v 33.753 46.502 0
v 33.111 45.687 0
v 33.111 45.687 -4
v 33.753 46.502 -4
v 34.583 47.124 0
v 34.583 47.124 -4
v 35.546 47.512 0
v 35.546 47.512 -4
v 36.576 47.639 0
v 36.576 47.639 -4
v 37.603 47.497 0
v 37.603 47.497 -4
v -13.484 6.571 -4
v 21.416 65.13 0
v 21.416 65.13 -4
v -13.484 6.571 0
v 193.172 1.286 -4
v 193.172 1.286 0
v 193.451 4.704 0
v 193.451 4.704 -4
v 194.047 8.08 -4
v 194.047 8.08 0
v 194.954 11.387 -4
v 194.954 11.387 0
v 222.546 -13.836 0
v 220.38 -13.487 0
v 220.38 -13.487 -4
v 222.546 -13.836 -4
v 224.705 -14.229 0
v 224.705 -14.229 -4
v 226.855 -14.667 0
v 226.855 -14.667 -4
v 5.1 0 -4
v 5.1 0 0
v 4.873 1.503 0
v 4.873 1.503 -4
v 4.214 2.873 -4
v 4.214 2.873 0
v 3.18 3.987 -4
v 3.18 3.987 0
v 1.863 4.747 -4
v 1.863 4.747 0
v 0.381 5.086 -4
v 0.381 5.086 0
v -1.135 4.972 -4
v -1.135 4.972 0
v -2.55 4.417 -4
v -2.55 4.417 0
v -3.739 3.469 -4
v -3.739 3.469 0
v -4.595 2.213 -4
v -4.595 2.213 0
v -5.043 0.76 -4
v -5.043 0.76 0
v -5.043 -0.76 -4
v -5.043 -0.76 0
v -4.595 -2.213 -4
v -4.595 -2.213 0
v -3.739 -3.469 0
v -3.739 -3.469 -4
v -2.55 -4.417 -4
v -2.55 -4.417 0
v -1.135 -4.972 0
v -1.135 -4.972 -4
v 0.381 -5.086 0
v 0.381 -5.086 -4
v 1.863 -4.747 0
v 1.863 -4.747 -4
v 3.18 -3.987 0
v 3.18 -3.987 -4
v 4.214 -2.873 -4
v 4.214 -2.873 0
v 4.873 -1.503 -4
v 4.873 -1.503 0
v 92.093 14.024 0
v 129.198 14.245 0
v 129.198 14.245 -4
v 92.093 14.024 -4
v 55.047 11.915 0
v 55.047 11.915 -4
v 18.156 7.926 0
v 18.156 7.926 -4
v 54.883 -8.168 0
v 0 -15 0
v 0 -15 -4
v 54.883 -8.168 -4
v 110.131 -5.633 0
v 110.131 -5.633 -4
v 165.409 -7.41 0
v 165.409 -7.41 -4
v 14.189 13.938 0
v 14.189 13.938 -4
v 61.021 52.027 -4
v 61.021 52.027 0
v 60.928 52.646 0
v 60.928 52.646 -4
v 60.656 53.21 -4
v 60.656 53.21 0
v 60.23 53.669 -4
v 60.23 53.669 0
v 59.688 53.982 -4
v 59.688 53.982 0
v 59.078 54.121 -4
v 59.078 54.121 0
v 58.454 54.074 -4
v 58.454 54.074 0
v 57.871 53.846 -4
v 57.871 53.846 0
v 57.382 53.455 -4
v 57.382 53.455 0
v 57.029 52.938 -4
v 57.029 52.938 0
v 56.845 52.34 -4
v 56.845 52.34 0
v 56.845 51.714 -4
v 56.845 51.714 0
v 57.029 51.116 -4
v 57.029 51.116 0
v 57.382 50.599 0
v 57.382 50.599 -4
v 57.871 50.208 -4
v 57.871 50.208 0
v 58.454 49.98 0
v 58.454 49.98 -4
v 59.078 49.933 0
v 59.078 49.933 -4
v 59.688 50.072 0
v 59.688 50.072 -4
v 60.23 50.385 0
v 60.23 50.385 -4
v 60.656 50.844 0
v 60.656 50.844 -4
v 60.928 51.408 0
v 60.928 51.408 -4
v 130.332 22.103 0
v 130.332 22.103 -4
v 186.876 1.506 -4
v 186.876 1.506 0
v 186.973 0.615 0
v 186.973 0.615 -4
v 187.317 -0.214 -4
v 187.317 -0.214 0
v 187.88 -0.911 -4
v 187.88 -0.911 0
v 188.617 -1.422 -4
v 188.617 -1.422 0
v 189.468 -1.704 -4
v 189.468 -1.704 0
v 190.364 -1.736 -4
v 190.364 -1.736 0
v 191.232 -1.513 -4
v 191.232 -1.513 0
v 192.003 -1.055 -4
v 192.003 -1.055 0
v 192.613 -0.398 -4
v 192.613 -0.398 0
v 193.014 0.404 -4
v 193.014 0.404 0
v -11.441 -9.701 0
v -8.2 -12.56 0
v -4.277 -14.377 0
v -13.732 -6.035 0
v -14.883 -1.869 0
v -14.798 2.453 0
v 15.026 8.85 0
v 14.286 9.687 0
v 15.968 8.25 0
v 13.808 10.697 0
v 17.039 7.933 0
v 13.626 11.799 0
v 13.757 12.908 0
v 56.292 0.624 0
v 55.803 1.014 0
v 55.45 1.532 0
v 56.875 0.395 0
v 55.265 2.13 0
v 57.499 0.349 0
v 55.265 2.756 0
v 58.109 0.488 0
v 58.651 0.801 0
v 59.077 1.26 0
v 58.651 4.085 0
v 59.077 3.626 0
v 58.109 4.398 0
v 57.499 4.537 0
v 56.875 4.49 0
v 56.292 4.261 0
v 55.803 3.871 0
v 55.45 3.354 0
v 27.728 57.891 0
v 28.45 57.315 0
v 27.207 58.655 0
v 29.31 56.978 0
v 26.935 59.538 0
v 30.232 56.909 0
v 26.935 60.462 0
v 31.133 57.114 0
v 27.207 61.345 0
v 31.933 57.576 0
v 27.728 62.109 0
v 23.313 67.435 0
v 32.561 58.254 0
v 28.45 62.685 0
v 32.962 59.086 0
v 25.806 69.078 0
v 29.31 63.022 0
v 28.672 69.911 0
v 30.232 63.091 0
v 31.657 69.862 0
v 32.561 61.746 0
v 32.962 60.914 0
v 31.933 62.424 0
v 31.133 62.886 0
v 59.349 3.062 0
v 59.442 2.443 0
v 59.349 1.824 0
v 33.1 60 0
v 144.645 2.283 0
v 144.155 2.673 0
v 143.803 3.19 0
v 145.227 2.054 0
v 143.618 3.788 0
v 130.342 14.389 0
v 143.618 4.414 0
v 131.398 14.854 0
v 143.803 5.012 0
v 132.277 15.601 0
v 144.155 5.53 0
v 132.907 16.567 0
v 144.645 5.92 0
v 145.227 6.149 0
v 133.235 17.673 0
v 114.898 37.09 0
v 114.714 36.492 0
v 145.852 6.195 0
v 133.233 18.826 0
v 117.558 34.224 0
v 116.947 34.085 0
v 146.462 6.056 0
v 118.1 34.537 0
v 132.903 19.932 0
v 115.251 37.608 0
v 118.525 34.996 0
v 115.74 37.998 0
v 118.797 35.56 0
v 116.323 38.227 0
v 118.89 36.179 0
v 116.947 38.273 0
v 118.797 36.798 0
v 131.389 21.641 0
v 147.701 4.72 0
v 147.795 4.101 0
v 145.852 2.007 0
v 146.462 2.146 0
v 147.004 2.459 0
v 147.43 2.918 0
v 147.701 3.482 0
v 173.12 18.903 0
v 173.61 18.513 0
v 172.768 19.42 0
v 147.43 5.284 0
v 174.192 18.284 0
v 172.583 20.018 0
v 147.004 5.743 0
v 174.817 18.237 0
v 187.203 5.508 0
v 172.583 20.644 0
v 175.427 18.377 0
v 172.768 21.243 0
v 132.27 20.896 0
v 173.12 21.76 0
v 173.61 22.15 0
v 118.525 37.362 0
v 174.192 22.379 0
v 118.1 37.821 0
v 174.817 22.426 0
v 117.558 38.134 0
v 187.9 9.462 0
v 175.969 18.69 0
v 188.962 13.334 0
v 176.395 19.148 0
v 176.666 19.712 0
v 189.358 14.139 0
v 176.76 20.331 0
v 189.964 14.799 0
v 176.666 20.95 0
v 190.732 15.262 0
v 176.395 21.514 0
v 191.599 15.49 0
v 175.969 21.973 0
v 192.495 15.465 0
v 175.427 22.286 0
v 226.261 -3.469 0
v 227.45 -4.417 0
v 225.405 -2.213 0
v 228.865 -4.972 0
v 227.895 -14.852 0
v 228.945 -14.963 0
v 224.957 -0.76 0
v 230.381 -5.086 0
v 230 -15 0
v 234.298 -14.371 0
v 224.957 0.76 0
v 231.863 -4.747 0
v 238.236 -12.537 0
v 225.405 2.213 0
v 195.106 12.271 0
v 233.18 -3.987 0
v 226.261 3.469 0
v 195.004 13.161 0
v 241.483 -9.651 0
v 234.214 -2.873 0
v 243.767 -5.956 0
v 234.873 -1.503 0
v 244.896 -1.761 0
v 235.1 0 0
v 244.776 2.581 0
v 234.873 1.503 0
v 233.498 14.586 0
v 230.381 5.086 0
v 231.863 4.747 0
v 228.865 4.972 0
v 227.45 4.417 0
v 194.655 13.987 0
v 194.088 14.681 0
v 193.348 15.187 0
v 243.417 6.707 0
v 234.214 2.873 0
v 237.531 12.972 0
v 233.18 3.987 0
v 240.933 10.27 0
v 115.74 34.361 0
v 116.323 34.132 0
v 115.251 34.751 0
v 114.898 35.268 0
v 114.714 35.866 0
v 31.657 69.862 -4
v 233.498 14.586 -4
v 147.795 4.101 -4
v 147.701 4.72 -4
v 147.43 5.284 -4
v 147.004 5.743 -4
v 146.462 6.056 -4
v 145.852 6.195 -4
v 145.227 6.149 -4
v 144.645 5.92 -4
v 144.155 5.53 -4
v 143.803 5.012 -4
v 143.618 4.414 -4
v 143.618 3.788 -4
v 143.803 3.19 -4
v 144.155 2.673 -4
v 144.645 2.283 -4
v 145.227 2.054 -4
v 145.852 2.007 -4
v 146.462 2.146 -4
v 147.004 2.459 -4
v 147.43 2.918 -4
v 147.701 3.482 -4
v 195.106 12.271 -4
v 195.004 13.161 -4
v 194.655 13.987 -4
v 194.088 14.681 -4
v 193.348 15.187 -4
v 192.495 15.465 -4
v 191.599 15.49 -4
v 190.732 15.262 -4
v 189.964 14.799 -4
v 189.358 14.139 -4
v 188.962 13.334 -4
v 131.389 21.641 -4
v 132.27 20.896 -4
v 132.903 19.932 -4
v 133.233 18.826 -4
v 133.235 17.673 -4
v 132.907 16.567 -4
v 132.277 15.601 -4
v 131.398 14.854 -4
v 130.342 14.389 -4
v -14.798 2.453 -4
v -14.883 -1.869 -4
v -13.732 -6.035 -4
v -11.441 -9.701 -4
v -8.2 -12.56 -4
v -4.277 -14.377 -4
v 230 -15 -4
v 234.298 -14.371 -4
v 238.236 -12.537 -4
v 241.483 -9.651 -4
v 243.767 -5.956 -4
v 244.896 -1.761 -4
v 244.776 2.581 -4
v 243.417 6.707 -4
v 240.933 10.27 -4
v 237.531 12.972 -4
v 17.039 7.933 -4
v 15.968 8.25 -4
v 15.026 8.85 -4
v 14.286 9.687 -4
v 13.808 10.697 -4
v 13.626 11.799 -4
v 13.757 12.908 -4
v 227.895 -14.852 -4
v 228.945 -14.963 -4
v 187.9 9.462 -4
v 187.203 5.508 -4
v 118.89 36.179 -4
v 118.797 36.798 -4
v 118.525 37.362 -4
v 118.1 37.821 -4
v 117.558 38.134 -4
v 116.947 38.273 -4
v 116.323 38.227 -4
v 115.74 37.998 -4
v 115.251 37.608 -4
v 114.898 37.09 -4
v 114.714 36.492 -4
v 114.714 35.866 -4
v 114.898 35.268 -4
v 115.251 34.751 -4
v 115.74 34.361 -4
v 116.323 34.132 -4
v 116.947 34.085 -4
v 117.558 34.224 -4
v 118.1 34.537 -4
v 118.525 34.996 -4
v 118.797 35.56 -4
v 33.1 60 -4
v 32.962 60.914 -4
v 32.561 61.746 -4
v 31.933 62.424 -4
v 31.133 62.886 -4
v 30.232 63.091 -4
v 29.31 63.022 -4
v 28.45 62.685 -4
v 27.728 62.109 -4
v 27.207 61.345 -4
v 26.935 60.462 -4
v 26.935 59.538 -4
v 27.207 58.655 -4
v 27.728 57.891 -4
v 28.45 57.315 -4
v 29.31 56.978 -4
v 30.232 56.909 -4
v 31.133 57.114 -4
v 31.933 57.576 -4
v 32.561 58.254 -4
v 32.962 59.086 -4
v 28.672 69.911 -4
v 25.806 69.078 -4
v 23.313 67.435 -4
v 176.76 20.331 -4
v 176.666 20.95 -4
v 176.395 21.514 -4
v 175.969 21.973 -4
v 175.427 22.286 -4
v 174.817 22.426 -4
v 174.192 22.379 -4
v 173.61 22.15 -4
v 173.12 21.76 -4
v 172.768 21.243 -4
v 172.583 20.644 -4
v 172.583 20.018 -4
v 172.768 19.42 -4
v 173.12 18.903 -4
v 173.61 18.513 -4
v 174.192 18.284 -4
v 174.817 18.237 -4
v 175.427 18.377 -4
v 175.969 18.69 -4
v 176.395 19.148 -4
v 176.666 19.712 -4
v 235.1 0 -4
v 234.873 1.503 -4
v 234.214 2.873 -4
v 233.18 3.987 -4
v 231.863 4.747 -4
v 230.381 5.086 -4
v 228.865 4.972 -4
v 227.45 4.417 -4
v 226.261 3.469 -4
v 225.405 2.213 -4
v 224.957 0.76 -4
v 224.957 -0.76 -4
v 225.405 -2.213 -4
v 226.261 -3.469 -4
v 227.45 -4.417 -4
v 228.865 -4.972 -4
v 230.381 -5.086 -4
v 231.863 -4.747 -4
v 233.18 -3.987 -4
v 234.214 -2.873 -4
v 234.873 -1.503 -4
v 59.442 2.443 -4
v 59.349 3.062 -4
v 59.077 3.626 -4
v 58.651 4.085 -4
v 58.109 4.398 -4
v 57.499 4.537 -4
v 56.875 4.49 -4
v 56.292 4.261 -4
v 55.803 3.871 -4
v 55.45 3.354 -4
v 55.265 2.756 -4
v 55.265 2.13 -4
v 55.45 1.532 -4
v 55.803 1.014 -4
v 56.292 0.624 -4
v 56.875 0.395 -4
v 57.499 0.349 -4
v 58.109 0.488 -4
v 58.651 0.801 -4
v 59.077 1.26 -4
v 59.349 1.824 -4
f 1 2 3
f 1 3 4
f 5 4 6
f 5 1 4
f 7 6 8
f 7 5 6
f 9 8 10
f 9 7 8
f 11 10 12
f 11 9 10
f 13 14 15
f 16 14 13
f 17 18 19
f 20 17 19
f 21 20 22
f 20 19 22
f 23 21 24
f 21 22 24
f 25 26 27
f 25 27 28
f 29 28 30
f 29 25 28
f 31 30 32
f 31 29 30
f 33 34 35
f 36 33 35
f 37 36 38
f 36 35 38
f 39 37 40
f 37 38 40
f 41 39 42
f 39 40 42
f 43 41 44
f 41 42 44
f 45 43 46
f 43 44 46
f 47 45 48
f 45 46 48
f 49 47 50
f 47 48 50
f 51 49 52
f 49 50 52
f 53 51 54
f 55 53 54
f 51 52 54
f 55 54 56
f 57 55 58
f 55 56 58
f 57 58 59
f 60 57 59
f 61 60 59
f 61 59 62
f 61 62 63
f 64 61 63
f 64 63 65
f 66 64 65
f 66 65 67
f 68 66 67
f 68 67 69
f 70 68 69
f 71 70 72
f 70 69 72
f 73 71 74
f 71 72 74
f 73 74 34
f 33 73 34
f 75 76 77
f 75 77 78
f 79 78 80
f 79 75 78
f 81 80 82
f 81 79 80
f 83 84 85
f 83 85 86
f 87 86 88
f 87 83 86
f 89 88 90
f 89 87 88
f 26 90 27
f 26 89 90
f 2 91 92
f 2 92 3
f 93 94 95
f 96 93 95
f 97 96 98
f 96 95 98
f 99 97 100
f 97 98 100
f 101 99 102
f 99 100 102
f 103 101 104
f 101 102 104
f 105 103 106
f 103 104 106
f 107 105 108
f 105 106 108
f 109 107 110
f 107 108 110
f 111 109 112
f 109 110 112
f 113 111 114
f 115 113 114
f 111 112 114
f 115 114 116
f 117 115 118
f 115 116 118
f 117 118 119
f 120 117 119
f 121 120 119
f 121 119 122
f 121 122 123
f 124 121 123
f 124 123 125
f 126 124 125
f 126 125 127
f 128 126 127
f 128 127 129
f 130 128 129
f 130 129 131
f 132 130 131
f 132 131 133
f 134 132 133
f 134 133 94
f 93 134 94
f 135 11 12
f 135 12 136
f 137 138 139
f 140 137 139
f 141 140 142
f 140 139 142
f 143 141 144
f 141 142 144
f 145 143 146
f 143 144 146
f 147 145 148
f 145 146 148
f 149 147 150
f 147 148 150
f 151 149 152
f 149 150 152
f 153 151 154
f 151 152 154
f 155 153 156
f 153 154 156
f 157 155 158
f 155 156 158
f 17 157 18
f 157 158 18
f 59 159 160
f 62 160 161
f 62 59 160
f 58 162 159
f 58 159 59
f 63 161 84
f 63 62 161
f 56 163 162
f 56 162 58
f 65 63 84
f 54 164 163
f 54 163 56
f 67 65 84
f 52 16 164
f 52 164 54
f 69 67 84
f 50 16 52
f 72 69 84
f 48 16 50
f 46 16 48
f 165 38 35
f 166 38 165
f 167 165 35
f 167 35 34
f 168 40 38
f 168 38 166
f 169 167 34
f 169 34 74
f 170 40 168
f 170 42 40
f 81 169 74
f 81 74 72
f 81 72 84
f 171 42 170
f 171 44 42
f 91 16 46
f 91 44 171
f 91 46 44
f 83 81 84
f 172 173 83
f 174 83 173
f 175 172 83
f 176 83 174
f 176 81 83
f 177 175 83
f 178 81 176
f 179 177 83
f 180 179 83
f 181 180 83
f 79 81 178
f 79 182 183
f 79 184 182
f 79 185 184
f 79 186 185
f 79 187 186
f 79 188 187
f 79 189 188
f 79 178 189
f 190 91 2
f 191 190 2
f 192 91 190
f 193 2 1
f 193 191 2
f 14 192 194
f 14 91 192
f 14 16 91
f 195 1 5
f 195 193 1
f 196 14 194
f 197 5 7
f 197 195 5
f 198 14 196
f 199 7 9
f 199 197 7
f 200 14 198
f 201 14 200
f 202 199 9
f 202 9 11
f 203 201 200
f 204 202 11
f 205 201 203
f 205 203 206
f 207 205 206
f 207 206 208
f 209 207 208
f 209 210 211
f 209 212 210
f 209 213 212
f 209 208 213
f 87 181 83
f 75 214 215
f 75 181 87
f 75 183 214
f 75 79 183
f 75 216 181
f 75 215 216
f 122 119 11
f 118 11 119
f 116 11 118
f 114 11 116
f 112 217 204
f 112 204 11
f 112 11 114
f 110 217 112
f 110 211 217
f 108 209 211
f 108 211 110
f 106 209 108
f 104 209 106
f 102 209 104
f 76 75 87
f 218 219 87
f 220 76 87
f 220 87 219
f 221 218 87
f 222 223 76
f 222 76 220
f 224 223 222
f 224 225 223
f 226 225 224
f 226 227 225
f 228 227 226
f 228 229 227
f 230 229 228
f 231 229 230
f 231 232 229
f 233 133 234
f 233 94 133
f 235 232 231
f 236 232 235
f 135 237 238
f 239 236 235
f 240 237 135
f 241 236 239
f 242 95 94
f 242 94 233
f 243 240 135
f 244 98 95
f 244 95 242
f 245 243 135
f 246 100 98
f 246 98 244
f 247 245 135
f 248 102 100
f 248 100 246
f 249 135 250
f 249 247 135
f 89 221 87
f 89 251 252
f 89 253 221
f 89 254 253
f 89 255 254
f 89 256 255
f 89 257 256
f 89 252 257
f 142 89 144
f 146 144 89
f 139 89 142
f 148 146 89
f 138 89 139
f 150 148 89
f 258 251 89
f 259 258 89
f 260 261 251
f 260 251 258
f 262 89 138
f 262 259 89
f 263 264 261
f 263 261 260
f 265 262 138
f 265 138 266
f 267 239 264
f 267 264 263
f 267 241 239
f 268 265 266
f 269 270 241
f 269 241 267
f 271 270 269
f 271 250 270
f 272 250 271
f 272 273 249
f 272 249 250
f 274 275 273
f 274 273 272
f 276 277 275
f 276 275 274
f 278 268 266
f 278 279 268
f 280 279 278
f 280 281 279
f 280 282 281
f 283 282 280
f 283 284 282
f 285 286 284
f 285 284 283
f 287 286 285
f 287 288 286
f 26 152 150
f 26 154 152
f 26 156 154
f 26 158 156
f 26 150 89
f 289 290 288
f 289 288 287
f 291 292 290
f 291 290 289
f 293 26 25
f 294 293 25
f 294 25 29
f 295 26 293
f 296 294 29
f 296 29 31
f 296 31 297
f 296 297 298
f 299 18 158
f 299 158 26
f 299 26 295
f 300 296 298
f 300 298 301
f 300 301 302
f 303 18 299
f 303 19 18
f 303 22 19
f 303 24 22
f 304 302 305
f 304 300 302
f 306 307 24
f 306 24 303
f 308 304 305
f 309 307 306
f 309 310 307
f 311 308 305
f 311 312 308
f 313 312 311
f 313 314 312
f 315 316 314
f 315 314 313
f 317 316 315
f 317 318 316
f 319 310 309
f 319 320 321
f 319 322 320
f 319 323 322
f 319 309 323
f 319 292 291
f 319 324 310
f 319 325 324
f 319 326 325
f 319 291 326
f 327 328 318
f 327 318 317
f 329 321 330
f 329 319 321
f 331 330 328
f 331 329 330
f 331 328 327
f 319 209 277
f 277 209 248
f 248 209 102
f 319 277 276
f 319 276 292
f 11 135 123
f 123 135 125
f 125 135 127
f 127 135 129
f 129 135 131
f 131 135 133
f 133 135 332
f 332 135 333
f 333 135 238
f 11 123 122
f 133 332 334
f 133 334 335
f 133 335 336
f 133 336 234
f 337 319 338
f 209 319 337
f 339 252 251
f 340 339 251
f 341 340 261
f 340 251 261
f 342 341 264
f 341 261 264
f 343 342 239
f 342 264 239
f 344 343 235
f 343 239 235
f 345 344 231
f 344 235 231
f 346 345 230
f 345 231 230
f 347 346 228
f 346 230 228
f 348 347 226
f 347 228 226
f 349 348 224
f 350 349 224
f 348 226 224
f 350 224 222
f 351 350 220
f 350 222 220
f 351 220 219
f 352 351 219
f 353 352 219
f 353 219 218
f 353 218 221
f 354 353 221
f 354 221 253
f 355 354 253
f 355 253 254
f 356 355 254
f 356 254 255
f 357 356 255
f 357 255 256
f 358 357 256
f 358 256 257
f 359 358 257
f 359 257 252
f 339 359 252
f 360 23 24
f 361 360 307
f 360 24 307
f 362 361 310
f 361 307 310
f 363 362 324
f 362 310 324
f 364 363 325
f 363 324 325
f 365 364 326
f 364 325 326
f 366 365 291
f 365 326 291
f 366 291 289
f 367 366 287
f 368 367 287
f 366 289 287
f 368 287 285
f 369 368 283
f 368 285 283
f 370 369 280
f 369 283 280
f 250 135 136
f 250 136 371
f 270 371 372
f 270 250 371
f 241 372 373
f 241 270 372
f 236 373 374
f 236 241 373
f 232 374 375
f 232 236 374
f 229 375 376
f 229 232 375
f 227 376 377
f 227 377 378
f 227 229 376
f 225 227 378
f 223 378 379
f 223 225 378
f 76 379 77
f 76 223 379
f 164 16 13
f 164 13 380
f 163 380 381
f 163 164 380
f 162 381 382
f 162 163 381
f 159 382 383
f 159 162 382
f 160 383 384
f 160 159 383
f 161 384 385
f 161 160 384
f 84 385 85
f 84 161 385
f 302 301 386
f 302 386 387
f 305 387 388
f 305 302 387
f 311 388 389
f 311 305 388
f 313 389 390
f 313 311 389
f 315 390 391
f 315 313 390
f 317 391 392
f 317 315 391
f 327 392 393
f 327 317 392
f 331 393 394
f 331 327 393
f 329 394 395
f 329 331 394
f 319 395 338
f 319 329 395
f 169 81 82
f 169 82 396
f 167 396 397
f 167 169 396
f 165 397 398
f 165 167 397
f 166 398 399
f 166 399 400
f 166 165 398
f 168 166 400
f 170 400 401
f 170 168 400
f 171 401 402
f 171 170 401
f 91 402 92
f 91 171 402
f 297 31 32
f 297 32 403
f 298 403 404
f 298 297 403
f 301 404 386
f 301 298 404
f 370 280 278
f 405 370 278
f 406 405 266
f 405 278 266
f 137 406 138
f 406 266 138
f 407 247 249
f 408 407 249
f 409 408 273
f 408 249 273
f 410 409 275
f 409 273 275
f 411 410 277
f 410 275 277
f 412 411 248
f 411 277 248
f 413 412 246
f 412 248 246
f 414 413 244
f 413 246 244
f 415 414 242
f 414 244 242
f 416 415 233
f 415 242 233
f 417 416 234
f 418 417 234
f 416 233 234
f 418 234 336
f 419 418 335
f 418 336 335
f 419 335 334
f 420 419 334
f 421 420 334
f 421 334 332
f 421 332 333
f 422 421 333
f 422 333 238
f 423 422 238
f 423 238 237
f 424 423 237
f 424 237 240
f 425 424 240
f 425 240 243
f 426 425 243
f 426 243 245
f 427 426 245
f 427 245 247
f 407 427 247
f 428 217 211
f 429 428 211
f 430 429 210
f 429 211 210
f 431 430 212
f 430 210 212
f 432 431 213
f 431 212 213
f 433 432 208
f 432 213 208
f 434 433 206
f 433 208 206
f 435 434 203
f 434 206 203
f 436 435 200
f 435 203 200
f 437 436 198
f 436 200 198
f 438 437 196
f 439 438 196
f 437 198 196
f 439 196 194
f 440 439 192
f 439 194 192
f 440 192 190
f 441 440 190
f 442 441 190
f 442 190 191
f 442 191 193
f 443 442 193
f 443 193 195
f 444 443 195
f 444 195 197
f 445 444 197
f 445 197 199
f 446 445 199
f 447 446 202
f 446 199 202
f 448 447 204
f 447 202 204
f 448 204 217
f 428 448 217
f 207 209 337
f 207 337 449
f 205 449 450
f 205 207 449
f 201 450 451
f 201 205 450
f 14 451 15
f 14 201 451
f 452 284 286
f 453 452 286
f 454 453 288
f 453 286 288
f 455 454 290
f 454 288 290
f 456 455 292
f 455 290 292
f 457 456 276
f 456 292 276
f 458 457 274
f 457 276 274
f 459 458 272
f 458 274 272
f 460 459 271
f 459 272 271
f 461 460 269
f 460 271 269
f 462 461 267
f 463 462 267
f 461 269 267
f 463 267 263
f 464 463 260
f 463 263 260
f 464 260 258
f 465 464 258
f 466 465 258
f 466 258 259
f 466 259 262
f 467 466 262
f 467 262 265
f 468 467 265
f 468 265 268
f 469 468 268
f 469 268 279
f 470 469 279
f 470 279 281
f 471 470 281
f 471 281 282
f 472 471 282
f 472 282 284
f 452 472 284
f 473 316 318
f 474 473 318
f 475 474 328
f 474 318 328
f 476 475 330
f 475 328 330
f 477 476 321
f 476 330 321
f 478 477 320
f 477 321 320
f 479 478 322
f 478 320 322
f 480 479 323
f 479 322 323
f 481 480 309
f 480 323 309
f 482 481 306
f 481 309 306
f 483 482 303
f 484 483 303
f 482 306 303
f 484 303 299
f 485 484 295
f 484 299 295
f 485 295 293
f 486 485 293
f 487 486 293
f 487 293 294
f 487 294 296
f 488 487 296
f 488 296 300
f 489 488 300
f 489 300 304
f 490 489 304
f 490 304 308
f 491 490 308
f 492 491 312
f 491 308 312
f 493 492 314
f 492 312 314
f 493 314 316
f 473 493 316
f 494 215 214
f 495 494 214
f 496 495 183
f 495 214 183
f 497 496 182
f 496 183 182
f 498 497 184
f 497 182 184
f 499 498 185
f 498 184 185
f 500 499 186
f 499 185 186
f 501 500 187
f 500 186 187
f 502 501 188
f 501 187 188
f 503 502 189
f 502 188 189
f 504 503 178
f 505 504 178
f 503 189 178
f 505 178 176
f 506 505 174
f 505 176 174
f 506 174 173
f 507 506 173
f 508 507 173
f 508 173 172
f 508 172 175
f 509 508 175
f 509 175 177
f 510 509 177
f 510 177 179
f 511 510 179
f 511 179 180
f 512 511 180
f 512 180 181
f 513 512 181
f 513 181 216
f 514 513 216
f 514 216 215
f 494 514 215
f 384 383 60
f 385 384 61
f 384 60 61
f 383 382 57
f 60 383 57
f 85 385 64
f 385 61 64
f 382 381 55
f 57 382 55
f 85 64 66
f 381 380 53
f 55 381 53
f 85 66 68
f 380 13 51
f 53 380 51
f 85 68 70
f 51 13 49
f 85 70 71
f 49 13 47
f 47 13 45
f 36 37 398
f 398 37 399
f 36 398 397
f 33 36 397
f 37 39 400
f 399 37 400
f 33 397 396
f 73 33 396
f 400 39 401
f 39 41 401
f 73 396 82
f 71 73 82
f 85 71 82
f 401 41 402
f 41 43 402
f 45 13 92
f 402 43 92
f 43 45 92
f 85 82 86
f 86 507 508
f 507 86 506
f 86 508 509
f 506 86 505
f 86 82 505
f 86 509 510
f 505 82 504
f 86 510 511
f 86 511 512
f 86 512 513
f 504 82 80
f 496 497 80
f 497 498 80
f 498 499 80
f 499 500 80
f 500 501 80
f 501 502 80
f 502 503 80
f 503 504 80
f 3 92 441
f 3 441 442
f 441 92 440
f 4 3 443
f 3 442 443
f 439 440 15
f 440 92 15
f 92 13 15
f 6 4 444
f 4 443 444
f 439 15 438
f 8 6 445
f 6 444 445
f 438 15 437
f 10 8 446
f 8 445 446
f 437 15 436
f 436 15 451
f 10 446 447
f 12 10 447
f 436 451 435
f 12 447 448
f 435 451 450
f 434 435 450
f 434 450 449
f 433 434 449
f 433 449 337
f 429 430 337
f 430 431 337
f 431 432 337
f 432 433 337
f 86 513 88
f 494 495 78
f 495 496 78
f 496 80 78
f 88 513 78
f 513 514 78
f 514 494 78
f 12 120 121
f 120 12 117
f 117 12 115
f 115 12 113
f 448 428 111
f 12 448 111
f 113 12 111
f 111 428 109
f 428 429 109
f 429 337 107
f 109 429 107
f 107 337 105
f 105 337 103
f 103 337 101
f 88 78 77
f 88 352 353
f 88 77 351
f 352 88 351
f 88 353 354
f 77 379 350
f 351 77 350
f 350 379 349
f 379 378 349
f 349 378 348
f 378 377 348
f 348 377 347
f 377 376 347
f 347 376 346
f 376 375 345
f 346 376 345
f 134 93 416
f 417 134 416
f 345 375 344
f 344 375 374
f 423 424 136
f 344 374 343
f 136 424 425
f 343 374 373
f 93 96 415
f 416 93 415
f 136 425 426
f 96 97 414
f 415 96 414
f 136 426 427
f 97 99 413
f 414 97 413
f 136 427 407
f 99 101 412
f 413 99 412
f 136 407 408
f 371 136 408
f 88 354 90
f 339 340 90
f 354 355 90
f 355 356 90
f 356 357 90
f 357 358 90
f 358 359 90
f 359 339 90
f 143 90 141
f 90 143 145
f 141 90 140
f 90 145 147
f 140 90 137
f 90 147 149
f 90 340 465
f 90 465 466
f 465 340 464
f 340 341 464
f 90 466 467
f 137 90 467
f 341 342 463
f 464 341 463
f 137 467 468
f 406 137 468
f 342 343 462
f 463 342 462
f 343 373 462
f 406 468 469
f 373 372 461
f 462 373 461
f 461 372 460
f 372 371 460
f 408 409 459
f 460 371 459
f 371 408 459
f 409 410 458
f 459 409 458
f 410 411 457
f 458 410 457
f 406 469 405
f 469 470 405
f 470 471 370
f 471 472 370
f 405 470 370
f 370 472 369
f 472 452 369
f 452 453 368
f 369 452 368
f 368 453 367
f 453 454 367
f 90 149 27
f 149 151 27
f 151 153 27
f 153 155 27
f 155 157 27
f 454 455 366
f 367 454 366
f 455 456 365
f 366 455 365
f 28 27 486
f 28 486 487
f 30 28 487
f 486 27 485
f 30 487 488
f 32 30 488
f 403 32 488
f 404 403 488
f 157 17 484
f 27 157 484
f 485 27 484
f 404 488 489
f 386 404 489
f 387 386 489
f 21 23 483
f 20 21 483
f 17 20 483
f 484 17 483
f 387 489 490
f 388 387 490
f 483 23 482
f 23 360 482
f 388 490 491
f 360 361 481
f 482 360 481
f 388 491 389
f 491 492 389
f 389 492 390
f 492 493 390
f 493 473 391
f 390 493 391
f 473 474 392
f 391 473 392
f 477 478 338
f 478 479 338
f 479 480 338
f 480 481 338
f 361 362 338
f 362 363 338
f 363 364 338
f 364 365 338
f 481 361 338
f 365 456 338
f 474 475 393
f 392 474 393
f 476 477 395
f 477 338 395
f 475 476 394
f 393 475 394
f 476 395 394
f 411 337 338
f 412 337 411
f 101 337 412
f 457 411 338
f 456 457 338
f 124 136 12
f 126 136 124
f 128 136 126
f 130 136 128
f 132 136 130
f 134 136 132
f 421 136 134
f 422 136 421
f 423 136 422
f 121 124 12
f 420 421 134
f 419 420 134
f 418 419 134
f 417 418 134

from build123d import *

# Parameters (mm, degrees)
SKETCH_1_R             = 5.1
SKETCH_1_R_2           = 3.1
SM_BASE_FLANGE_1_DEPTH = 4
SKETCH_29_R            = 2.1
CUT_EXTRUDE_7_DEPTH    = 10
CUT_EXTRUDE_11_DEPTH   = 10


# Sheet-metal steps are written as plain solids
with BuildPart() as part:
    # Sketch 1 → Базовая кромка1 (new body)
    with BuildSketch(Plane.XY):
        with BuildLine():
            Line((21.416256147, 65.130237954), (-13.484101554, 6.571073374))
            ThreePointArc((-13.484101554, 6.571073374), (-12.719396617, -7.950908734), (0, -15))
            ThreePointArc((0, -15), (110.130832642, -5.633175847), (220.379871586, -13.487289734))
            ThreePointArc((220.379871586, -13.487289734), (223.626784147, -14.026708962), (226.855383886, -14.666676157))
            ThreePointArc((226.855383886, -14.666676157), (228.418883679, -14.916436276), (230, -15))
            ThreePointArc((230, -15), (244.896230479, -1.761339697), (233.49830961, 14.586357663))
            Line((233.49830961, 14.586357663), (31.656582874, 69.861832141))
            ThreePointArc((31.656582874, 69.861832141), (25.805552993, 69.077808893), (21.416256147, 65.130237954))
        make_face()
        Circle(SKETCH_1_R, mode=Mode.SUBTRACT)
        with Locations((230, 0)):
            Circle(SKETCH_1_R, mode=Mode.SUBTRACT)
        with Locations((30, 60)):
            Circle(SKETCH_1_R_2, mode=Mode.SUBTRACT)
        with BuildLine():
            Line((37.603385022, 47.496856423), (130.332311604, 22.102526432))
            ThreePointArc((130.332311604, 22.102526432), (133.234743351, 17.673003854), (129.197928501, 14.245336107))
            ThreePointArc((129.197928501, 14.245336107), (73.556484101, 13.205174657), (18.156304087, 7.92574997))
            ThreePointArc((18.156304087, 7.92574997), (14.286499385, 9.687372505), (14.189161482, 13.938163928))
            Line((14.189161482, 13.938163928), (33.110820822, 45.686737192))
            ThreePointArc((33.110820822, 45.686737192), (35.05198474, 47.349074558), (37.603385022, 47.496856423))
        make_face(mode=Mode.SUBTRACT)
    extrude(amount=-SM_BASE_FLANGE_1_DEPTH)

    # Эскиз29 → Вырез-Вытянуть7 (cut)
    with BuildSketch(Plane.XY):
        with Locations((116.790365799, 36.179268785)):
            Circle(SKETCH_29_R)
        with Locations((174.659589105, 20.331461556)):
            Circle(SKETCH_29_R)
        with Locations((58.921142493, 52.027076013)):
            Circle(SKETCH_29_R)
        with Locations((57.341971973, 2.442823407)):
            Circle(SKETCH_29_R)
        with Locations((145.69468633, 4.101167629)):
            Circle(SKETCH_29_R)
    extrude(amount=-CUT_EXTRUDE_7_DEPTH, mode=Mode.SUBTRACT)

    # Эскиз47 → Вырез-Вытянуть11 (cut)
    with BuildSketch(Plane.XY):
        with BuildLine():
            ThreePointArc((186.876285814, 1.505913283), (189.914433505, -1.752101237), (193.172448024, 1.286046453))
            ThreePointArc((193.172448024, 1.286046453), (193.709834302, 6.398935347), (194.953567375, 11.387276243))
            ThreePointArc((194.953567375, 11.387276243), (192.93114288, 15.356507801), (188.961911322, 13.334083307))
            ThreePointArc((188.961911322, 13.334083307), (187.505545458, 7.492918866), (186.876285814, 1.505913283))
        make_face()
    extrude(amount=-CUT_EXTRUDE_11_DEPTH, mode=Mode.SUBTRACT)


solid = part.part
